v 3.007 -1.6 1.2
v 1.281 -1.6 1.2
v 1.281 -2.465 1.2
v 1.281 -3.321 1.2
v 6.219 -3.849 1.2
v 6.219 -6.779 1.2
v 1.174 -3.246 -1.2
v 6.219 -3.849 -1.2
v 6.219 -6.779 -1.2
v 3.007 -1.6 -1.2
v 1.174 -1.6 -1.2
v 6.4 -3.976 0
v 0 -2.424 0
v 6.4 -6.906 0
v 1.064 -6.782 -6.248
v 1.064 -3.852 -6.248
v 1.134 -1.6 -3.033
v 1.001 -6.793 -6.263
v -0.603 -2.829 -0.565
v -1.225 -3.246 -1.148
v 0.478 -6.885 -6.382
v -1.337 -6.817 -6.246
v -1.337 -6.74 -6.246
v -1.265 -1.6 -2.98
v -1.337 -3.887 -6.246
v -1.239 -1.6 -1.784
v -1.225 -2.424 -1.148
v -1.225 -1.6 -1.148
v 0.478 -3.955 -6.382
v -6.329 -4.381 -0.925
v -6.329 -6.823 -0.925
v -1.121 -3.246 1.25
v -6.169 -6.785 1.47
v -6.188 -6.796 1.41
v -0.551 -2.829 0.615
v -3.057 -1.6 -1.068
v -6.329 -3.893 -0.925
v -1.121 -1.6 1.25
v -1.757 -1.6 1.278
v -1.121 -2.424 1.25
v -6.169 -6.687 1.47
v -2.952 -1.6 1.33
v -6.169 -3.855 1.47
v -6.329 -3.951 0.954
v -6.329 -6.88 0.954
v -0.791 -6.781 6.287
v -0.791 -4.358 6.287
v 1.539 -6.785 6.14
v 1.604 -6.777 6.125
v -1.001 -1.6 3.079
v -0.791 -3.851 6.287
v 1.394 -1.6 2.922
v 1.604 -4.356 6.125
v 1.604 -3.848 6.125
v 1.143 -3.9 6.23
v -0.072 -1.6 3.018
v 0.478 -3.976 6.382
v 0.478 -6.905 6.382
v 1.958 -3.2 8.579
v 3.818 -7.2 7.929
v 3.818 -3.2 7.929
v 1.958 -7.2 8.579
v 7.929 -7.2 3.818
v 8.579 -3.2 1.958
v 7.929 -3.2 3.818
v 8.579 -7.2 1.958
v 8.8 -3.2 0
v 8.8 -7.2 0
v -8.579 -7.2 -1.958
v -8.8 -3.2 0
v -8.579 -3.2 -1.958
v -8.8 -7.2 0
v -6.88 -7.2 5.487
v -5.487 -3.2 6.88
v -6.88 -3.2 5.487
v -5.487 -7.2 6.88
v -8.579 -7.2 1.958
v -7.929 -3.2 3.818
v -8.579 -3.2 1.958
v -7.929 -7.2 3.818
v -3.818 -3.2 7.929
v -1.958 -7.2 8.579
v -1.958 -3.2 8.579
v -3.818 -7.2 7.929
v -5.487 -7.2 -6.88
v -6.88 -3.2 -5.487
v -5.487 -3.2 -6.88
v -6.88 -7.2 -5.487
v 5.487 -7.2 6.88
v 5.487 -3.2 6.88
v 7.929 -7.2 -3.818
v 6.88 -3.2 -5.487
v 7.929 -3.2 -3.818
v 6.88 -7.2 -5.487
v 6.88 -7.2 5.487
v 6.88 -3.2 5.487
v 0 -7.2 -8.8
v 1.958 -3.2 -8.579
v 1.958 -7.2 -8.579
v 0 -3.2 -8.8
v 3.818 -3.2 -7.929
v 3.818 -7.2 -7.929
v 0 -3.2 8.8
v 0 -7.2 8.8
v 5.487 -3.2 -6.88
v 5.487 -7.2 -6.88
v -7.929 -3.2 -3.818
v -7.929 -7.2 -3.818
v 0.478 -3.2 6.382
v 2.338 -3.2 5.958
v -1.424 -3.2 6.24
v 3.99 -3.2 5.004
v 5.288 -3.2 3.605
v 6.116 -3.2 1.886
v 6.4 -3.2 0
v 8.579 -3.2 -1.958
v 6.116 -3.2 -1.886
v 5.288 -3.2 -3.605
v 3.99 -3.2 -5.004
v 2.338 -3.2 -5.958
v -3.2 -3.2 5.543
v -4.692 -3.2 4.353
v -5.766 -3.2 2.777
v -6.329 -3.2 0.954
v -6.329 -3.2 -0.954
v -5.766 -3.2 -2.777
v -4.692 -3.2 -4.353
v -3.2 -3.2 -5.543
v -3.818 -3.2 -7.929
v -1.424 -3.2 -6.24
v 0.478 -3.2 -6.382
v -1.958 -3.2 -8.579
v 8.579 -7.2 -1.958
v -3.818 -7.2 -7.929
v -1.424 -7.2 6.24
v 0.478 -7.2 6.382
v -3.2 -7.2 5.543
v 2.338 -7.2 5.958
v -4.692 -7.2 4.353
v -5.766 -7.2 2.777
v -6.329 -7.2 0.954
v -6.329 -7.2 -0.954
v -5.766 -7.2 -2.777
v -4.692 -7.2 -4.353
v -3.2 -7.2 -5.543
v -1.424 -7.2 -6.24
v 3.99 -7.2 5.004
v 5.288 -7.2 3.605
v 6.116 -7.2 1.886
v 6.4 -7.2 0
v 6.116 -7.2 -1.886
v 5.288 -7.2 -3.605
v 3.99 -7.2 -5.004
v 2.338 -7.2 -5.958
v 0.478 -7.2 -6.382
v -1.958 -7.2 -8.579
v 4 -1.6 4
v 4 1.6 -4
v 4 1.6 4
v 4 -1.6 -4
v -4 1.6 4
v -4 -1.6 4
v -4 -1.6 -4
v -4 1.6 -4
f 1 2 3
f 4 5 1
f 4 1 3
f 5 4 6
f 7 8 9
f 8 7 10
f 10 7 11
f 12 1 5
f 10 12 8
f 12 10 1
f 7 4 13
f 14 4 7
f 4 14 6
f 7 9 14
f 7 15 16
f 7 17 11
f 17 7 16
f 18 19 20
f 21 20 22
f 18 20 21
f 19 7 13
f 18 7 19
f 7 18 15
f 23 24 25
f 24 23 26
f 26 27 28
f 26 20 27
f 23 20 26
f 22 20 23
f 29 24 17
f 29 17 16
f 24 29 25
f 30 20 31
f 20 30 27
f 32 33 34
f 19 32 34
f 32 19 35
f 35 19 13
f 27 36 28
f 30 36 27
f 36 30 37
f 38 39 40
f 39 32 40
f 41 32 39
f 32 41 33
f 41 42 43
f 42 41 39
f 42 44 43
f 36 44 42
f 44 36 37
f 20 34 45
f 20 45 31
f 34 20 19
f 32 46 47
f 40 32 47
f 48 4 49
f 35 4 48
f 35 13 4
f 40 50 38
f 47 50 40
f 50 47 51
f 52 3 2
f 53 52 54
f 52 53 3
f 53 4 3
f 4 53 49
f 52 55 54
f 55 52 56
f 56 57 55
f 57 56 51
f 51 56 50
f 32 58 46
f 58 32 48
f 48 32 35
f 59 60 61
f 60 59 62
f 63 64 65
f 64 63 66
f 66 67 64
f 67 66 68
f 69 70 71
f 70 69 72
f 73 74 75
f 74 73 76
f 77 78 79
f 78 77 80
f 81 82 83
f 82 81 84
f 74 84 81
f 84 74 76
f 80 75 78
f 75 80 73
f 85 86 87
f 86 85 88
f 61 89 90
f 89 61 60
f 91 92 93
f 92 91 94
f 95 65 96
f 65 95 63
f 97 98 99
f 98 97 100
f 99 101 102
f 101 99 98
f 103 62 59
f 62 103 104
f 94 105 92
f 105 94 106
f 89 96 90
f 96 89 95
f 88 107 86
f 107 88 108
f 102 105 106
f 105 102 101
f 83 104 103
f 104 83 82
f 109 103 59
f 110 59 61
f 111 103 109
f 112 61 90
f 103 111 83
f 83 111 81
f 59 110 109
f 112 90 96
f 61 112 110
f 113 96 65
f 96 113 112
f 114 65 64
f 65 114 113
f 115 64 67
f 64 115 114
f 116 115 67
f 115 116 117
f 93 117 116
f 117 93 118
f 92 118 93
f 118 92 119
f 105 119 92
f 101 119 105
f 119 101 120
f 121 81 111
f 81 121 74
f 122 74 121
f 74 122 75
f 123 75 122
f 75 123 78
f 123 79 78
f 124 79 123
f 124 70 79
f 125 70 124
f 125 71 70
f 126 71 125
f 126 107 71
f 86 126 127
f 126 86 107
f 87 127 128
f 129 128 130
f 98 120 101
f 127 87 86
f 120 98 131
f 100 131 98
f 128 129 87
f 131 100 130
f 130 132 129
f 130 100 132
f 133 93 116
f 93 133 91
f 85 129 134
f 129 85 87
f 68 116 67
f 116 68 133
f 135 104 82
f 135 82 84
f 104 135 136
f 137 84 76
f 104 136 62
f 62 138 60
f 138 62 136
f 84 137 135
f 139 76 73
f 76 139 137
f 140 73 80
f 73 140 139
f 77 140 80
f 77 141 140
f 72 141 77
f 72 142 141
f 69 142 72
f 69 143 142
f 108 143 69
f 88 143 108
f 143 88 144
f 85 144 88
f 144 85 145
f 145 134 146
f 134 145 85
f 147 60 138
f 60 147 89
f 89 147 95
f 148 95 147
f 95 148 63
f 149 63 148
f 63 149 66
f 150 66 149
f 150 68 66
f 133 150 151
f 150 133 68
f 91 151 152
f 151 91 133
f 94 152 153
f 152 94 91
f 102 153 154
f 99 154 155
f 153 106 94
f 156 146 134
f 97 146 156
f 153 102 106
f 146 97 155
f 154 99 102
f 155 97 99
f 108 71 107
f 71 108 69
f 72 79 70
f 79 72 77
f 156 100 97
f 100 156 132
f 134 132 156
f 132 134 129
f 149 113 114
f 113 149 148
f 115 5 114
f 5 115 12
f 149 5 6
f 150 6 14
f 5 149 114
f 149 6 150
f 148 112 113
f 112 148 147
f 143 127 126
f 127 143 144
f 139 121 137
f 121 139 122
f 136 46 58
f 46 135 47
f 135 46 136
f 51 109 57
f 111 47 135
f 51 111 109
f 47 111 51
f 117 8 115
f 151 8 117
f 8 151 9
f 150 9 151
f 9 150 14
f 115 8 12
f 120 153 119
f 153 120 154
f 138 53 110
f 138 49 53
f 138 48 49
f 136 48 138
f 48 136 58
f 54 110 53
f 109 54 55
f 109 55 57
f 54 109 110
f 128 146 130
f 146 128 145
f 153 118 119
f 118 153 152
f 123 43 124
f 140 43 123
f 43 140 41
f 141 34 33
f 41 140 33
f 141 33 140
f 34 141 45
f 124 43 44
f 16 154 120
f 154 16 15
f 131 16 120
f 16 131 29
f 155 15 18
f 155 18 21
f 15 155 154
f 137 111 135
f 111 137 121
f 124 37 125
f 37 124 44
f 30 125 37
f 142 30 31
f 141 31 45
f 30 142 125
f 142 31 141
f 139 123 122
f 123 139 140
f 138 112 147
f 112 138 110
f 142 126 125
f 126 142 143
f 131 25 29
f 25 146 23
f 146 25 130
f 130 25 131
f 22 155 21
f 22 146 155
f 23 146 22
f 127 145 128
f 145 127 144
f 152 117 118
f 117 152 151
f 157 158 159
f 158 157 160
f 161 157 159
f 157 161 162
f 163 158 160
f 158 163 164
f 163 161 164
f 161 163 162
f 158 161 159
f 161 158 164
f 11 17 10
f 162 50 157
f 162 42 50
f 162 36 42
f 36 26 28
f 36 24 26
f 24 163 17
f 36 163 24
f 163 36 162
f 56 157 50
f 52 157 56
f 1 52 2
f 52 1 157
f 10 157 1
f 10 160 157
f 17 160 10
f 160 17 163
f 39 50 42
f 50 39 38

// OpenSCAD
size=32; //block=32 //item=8






translate([-size*0,size*0,0]){	//knub
cube([size*0.25,size*0.1,size*0.25],center=true);
};	//translate

translate([0,-size*0.1,0]){	//connecting ring
union(){
count=4;
for(i=[0:1:count-1]){
rotate([0,365/count*i,0]){
translate([size*0.1,0,0]){
rotate([0,0,-35]){
cube([size*0.30,size*0.075,size*0.075],center=true);
};	//rotate
};	//translate
};	//rotate
};	//for
};	//union
};	//translat

translate([size*0,-size*0.1,0]){	//ring
	rotate([90,0,0]){
		difference(){
			cylinder(d=size*0.55,h=size*0.125);
			translate([size*0,size*0,-size*0.0125]){
				cylinder(d=size*0.40,h=size*0.125*2);
			};	//translate
		};	//difference
	};	//rotate
};	//translate
